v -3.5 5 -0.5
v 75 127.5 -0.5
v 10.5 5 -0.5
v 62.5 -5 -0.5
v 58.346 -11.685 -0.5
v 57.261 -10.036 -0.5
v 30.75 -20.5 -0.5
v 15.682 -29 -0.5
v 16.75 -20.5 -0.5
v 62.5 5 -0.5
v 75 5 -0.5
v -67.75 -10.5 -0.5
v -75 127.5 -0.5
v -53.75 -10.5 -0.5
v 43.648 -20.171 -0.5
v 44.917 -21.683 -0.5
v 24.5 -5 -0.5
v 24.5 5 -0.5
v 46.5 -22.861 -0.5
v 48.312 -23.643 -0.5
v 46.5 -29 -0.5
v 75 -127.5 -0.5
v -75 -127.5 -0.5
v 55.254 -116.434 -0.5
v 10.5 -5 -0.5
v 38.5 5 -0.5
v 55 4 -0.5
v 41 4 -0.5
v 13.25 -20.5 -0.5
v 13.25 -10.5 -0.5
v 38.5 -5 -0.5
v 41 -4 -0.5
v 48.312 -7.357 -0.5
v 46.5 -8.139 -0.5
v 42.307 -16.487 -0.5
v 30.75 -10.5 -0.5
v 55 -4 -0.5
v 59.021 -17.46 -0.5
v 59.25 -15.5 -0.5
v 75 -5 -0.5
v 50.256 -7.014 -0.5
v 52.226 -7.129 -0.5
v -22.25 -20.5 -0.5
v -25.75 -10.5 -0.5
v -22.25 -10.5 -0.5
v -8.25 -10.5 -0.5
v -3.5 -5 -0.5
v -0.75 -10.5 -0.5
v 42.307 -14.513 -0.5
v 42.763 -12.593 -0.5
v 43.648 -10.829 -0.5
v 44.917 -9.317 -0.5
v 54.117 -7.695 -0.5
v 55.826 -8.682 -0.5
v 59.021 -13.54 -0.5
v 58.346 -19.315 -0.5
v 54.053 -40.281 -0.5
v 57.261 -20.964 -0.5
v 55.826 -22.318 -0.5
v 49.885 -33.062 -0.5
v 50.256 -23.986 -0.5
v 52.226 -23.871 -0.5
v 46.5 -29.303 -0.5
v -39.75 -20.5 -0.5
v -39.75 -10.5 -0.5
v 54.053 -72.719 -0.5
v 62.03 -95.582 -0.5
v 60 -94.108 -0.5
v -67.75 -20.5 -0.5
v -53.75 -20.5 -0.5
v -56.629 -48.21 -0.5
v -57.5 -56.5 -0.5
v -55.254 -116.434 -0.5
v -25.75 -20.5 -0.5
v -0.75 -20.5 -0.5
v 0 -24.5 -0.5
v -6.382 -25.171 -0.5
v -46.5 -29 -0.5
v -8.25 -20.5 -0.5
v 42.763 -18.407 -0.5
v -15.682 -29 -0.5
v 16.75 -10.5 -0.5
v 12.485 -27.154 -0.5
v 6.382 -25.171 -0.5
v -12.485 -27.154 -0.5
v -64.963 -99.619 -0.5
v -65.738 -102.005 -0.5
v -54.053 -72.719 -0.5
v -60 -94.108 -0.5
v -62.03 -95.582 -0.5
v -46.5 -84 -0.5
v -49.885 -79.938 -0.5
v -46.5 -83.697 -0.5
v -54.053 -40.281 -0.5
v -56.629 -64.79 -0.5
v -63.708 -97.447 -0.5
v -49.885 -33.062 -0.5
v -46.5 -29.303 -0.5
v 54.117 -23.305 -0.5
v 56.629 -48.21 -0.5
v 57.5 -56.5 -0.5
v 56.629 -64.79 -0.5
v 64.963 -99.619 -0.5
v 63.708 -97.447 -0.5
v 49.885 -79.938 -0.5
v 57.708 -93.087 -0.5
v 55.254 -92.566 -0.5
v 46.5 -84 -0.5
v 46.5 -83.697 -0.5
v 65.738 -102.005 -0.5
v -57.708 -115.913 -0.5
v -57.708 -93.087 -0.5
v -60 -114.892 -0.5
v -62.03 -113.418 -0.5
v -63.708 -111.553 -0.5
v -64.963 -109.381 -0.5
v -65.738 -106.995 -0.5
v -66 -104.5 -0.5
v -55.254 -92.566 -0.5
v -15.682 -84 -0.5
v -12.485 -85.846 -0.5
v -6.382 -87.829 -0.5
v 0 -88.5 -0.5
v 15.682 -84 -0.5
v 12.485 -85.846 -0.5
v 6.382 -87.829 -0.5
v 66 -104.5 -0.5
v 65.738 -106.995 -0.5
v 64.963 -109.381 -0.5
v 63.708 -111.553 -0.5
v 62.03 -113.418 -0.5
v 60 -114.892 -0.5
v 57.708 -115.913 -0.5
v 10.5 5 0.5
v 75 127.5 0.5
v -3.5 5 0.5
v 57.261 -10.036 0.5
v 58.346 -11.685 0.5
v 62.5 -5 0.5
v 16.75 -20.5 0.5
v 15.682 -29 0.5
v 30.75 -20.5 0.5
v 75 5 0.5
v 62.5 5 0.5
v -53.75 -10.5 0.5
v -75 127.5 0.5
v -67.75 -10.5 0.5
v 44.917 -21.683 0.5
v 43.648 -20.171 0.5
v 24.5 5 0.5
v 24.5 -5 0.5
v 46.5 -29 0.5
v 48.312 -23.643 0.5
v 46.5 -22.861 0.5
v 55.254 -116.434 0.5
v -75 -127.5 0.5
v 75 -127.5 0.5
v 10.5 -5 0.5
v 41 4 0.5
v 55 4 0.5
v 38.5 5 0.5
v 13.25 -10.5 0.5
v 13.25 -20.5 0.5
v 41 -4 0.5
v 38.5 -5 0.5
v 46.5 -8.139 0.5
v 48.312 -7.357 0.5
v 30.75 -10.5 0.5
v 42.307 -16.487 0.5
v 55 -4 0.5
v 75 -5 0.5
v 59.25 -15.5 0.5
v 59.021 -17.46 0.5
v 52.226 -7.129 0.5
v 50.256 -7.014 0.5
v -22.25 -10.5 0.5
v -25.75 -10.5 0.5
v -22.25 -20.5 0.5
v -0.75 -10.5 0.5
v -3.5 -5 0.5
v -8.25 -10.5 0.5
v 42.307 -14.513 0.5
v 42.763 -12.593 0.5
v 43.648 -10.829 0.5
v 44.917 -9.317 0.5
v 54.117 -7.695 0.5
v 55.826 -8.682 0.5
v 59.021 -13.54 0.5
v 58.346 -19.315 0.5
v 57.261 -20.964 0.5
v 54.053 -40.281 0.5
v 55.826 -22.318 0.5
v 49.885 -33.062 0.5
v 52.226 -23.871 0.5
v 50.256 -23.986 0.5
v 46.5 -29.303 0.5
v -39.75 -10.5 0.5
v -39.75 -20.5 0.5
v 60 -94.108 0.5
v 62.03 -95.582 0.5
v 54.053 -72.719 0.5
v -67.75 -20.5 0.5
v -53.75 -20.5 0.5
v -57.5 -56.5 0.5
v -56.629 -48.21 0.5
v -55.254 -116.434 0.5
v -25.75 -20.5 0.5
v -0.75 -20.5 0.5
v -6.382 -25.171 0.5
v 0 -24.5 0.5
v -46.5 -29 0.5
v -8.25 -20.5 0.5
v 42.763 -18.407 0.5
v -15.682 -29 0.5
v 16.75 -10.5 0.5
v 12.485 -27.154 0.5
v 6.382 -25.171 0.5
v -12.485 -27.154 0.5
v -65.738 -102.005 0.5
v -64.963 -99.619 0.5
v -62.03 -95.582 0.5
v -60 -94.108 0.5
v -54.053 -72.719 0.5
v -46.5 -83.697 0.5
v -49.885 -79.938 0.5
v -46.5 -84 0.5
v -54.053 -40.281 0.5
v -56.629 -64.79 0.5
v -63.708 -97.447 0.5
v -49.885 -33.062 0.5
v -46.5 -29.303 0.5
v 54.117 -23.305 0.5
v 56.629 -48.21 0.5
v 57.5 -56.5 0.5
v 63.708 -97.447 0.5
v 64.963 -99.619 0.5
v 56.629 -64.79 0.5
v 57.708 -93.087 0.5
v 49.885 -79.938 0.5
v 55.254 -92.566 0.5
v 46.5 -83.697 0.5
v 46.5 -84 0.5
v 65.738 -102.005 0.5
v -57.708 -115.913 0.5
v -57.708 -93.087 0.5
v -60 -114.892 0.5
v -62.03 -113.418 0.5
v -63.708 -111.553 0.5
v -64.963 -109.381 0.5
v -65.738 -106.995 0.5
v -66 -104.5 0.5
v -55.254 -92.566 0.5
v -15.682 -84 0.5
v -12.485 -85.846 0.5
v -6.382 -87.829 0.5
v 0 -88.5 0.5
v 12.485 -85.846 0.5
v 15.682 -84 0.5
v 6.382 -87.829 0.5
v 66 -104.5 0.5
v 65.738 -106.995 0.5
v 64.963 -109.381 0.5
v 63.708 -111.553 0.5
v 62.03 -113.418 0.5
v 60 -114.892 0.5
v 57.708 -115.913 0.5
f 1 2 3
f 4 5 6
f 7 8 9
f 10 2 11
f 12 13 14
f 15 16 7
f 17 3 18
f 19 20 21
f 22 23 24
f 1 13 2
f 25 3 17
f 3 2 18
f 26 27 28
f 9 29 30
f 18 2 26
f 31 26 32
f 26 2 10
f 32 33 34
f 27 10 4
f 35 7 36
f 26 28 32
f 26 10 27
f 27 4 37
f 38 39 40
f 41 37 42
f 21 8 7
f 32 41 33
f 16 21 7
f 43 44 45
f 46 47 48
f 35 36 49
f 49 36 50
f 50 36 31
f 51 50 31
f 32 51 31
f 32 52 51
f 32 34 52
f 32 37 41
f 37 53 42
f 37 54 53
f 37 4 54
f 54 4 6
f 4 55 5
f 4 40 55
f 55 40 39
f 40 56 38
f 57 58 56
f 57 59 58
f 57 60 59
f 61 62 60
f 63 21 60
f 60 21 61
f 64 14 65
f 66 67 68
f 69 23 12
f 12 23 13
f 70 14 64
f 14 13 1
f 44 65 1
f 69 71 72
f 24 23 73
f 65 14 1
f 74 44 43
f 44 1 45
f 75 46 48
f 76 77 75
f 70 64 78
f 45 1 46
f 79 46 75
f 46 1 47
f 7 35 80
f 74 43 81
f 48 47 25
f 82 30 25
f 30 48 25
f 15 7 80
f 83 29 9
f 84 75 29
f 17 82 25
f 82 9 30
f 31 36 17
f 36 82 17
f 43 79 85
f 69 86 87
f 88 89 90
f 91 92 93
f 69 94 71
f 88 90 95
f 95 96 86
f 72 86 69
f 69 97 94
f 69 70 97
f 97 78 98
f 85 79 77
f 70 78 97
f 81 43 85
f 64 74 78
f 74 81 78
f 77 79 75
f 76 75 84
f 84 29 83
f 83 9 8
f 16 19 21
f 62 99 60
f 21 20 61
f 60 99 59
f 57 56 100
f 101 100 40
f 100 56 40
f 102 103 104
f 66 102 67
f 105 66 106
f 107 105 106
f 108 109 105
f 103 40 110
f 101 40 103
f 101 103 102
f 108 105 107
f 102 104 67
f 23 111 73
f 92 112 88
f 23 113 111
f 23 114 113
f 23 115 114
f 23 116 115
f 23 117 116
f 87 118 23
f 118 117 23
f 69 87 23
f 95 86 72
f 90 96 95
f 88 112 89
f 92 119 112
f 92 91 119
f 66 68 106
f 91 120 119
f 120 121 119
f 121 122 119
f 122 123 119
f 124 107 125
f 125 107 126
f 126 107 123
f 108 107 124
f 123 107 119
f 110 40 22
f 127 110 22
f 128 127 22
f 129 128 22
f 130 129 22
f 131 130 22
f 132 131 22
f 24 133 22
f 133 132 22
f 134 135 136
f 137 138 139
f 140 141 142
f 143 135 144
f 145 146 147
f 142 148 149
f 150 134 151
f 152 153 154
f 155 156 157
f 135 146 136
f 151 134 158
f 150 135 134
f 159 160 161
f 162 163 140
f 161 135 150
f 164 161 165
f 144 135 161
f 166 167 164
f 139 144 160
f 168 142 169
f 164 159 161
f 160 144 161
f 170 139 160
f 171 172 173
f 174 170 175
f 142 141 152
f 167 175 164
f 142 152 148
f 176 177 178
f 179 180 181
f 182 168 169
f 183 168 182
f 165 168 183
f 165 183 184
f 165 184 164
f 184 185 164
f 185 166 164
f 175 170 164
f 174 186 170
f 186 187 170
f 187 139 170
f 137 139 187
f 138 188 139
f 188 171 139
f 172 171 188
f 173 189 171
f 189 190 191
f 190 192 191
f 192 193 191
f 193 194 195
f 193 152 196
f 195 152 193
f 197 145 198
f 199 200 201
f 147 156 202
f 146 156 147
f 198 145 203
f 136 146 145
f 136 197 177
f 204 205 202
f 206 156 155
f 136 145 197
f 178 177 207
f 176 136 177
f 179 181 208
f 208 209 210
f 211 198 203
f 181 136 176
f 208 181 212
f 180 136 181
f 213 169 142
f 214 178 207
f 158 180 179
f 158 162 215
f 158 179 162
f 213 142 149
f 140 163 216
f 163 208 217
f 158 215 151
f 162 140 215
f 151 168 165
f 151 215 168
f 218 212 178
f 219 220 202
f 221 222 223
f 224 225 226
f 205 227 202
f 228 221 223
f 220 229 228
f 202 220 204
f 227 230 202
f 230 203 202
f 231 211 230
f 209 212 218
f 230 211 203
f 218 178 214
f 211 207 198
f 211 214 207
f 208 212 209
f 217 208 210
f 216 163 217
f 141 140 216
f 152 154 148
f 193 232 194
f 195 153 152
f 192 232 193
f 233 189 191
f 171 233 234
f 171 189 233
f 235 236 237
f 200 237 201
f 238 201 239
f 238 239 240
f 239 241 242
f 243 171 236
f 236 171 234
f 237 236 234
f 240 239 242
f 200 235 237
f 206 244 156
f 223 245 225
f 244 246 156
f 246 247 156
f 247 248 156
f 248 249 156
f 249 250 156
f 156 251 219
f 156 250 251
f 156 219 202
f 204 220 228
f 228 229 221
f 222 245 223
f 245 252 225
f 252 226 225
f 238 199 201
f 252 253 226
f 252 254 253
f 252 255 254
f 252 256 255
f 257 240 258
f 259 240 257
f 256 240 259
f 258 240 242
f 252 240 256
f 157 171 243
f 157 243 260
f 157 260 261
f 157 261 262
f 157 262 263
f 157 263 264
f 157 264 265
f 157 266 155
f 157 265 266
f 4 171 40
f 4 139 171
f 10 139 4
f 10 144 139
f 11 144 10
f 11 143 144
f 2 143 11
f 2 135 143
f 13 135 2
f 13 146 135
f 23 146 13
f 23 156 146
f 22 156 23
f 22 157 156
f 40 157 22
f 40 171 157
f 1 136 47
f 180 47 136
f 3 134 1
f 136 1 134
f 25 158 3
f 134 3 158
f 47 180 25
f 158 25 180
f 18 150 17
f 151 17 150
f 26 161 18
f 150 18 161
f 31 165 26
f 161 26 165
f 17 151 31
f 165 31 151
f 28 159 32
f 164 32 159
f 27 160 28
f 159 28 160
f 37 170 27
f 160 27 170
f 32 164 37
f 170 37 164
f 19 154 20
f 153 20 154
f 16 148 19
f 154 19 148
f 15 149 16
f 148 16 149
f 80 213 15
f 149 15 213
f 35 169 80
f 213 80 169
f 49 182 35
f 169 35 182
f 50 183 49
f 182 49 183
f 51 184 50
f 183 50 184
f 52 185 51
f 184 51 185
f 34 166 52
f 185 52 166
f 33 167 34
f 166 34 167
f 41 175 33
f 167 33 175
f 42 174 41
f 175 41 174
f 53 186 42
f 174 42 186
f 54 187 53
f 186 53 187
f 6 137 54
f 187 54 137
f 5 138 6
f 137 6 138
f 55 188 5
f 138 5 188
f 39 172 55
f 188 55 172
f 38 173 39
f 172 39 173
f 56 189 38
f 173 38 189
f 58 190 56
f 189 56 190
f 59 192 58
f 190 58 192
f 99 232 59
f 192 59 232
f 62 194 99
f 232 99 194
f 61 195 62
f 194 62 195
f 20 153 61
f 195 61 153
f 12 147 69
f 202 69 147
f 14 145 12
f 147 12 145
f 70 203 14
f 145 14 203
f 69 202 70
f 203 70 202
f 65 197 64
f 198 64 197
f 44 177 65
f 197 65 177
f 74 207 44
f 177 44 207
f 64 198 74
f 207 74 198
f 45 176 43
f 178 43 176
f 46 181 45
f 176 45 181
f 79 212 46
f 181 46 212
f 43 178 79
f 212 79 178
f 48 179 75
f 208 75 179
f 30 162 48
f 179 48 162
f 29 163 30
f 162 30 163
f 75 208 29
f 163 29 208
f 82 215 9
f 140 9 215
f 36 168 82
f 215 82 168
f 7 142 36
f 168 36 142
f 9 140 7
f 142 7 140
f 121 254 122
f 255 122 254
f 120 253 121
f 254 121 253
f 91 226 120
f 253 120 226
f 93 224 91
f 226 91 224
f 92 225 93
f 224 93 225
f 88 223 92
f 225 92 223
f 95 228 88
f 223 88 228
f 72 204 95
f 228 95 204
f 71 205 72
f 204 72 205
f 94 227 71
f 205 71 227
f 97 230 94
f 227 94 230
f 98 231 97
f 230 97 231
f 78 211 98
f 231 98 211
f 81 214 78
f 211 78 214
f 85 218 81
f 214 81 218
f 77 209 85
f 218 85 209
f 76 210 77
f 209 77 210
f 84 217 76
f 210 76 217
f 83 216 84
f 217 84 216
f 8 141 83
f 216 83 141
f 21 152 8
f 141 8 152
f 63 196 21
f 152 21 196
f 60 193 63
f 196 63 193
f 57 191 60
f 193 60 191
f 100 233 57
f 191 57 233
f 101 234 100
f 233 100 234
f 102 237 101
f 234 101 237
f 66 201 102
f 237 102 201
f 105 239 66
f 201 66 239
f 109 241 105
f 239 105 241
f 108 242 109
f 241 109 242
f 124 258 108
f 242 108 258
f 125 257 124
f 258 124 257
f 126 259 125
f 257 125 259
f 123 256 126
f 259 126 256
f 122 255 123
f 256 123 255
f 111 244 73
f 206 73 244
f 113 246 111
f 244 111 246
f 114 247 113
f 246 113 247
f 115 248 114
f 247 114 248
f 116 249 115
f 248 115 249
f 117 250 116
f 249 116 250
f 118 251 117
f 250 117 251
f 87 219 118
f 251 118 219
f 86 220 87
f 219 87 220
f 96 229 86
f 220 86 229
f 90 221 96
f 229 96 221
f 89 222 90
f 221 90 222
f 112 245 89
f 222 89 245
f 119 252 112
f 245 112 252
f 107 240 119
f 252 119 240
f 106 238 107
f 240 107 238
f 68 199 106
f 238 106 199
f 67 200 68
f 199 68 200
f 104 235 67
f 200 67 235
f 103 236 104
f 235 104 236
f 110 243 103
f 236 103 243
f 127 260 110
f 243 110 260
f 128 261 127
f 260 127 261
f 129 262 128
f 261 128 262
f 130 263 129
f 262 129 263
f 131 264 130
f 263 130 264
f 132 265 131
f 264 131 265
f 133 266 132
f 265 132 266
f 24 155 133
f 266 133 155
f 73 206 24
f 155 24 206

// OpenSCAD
pad_large_width = 22;
pad_large_depth = 19;
module pad_l() {
    square([pad_large_width, pad_large_depth], center = true);
}

pad_medium_width = 14;
pad_medium_depth = 10;
module pad_m() {
    square([pad_medium_width, pad_medium_depth], center = true);
}


pad_small_width = 14;
pad_small_depth = 8;
module pad_s() {
    square([pad_small_width, pad_small_depth], center = true);
}

pad_extra_small_width = 9;
pad_extra_small_depth = 9;
module pad_xs() {
    square([pad_extra_small_width, pad_extra_small_depth], center = true);
}

circle_tempo_diameter = 17;
module circle_tempo() {
    circle(d = circle_tempo_diameter);
}

module circle_s() {
    circle(d = 8);
}

module grill_slot() {
    circle([7, 1]);
}

// 132 wide, 24 high
module circle_stretched(width, depth) {
     translate([(depth - width) / 2, 0, 0]) hull() {
        translate([width - depth, 0, 0]) circle(d = depth);
        circle(d = depth);
    }
}

knobs_depth = 24;
module knobs() {
    circle_stretched(132, knobs_depth);
}

// 12mm from top/bottom
screw_diameter = 3;
module screw() {
    circle(1, d = screw_diameter);
}

function radius_from_chord_height(chord, height) =
    (height / 2) + ((chord * chord) / (height * 8));

module circle_segment(chord, height, angle = 0) {
    radius = radius_from_chord_height(chord, height);
    diameter = radius * 2;
    rotate([0, 0, angle]) translate([height - radius, 0, 0]) difference() {
        translate([0, 0, 0]) circle(r = radius);
        translate([-height, 0, 0]) square([diameter, diameter], center = true);
    }
}
 
screen_outer_width = 115;
screen_outer_depth = 64;

screen_inner_width = 93;
screen_inner_depth = 55;

module screen() {
    width_delta = (screen_outer_width - screen_inner_width) / 2;
    height_delta = (screen_outer_depth - screen_inner_depth) / 2;
    
    union() {
        translate([screen_inner_width / 2, 0, 0])
            circle_segment(screen_inner_depth, width_delta);
        
        translate([-screen_inner_width / 2, 0, 0])
            circle_segment(screen_inner_depth, width_delta, 180);
        
        translate([0, screen_inner_depth / 2, 0])
            circle_segment(32, height_delta, 90);
        
        translate([0, -screen_inner_depth / 2, 0])
            circle_segment(32, height_delta, 270);
        
        square([screen_inner_width, screen_inner_depth], center = true);
    }    
}

plate_depth = 255;
module plate() {
    square([150, plate_depth], center = true);
}


pattern_sequencer_width =
    3 * pad_medium_width + 14 + 3.5;
module pattern_sequencer() {
    position_0 = 0;
    translate([position_0, 0, 0])
        pad_m();
   
    position_1 = position_0 + pad_medium_width + 14;
    translate([position_1, 0, 0])
        pad_m();
   
    position_2 = position_1 + pad_medium_width + 3.5;
    translate([position_2, 0, 0])
        pad_m();
}

sample_edit_width = 
    2 * pad_medium_width + 3.5;
module sample_edit() {
    position_0 = 0;
    translate([position_0, 0, 0])
        pad_m();
   
    position_1 = position_0 + pad_medium_width + 3.5;
    translate([position_1, 0, 0])
        pad_m();
}

row_03_width =
    pattern_sequencer_width + 7.5 +
    sample_edit_width + 13 +
    circle_tempo_diameter;
row_03_depth_excluding_tempo = pad_medium_depth;

module row_03() {
    translate([(pad_medium_width / 2  - row_03_width) / 2, 0, 0]) {
        position_0 = 0;
        translate([position_0, 0, 0])
            pattern_sequencer();
        
        position_1 = position_0 + pattern_sequencer_width + 7.5;
        translate([position_1, 0, 0])
            sample_edit();
        
        position_2 = position_1 + sample_edit_width + 13;
        translate([position_2, 0, 0])
            circle_tempo();        
    }
};

module sampling() {
    position_0 = 0;
    translate([position_0, 0, 0])
        pad_m();
   
    position_1 = position_0 + pad_medium_width + 3.5;
    translate([position_1, 0, 0])
        pad_m();
}

row_04_width =
    0;
row_04_depth =
    pad_medium_depth;

module row_04() {
    translate([(pad_medium_width / 2 -row_04_width) / 2, 0, 0]) {
        // sampling
        pad_m();
        translate([14 + 14, 0, 0])
            pad_m();
        translate([13 + 14 + 3.5 + 14, 0, 0])
            pad_s();
        // sample mode
        translate([13 + 14 + 3.5 + 14 + 7.5 + 14, 0, 0])
            pad_m();
        translate([13 + 14 + 3.5 + 14 + 7.5 + 14 + 3.5 + 14, 0, 0])
            pad_m();
        translate([13 + 14 + 3.5 + 14 + 7.5 + 14 + 3.5 + 14 + 13 + 17/2, 0, 0])
            pad_s();
    }
}

module SP404SX() {
    top_from_origin = (-255 / 2);
    linear_extrude(1, center = true)
    difference() {
        plate();
        
        top_01 = top_from_origin + 23;
        translate([0, top_01, 0])
            knobs();
        
        top_02 = top_01  + (screen_outer_depth / 2) + (knobs_depth / 2) + 4;
        translate([0, top_02, 0])
            screen();
        
        top_03 = top_02 + (row_03_depth_excluding_tempo / 2) + (screen_outer_depth / 2) + 4;
        translate([0, top_03, 0])
            row_03();
        
        top_04 = top_03 + (row_04_depth / 2) + (row_03_depth_excluding_tempo / 2) + 4;
        translate([0, top_04, 0]);
            row_04();
    }   
}

SP404SX();
